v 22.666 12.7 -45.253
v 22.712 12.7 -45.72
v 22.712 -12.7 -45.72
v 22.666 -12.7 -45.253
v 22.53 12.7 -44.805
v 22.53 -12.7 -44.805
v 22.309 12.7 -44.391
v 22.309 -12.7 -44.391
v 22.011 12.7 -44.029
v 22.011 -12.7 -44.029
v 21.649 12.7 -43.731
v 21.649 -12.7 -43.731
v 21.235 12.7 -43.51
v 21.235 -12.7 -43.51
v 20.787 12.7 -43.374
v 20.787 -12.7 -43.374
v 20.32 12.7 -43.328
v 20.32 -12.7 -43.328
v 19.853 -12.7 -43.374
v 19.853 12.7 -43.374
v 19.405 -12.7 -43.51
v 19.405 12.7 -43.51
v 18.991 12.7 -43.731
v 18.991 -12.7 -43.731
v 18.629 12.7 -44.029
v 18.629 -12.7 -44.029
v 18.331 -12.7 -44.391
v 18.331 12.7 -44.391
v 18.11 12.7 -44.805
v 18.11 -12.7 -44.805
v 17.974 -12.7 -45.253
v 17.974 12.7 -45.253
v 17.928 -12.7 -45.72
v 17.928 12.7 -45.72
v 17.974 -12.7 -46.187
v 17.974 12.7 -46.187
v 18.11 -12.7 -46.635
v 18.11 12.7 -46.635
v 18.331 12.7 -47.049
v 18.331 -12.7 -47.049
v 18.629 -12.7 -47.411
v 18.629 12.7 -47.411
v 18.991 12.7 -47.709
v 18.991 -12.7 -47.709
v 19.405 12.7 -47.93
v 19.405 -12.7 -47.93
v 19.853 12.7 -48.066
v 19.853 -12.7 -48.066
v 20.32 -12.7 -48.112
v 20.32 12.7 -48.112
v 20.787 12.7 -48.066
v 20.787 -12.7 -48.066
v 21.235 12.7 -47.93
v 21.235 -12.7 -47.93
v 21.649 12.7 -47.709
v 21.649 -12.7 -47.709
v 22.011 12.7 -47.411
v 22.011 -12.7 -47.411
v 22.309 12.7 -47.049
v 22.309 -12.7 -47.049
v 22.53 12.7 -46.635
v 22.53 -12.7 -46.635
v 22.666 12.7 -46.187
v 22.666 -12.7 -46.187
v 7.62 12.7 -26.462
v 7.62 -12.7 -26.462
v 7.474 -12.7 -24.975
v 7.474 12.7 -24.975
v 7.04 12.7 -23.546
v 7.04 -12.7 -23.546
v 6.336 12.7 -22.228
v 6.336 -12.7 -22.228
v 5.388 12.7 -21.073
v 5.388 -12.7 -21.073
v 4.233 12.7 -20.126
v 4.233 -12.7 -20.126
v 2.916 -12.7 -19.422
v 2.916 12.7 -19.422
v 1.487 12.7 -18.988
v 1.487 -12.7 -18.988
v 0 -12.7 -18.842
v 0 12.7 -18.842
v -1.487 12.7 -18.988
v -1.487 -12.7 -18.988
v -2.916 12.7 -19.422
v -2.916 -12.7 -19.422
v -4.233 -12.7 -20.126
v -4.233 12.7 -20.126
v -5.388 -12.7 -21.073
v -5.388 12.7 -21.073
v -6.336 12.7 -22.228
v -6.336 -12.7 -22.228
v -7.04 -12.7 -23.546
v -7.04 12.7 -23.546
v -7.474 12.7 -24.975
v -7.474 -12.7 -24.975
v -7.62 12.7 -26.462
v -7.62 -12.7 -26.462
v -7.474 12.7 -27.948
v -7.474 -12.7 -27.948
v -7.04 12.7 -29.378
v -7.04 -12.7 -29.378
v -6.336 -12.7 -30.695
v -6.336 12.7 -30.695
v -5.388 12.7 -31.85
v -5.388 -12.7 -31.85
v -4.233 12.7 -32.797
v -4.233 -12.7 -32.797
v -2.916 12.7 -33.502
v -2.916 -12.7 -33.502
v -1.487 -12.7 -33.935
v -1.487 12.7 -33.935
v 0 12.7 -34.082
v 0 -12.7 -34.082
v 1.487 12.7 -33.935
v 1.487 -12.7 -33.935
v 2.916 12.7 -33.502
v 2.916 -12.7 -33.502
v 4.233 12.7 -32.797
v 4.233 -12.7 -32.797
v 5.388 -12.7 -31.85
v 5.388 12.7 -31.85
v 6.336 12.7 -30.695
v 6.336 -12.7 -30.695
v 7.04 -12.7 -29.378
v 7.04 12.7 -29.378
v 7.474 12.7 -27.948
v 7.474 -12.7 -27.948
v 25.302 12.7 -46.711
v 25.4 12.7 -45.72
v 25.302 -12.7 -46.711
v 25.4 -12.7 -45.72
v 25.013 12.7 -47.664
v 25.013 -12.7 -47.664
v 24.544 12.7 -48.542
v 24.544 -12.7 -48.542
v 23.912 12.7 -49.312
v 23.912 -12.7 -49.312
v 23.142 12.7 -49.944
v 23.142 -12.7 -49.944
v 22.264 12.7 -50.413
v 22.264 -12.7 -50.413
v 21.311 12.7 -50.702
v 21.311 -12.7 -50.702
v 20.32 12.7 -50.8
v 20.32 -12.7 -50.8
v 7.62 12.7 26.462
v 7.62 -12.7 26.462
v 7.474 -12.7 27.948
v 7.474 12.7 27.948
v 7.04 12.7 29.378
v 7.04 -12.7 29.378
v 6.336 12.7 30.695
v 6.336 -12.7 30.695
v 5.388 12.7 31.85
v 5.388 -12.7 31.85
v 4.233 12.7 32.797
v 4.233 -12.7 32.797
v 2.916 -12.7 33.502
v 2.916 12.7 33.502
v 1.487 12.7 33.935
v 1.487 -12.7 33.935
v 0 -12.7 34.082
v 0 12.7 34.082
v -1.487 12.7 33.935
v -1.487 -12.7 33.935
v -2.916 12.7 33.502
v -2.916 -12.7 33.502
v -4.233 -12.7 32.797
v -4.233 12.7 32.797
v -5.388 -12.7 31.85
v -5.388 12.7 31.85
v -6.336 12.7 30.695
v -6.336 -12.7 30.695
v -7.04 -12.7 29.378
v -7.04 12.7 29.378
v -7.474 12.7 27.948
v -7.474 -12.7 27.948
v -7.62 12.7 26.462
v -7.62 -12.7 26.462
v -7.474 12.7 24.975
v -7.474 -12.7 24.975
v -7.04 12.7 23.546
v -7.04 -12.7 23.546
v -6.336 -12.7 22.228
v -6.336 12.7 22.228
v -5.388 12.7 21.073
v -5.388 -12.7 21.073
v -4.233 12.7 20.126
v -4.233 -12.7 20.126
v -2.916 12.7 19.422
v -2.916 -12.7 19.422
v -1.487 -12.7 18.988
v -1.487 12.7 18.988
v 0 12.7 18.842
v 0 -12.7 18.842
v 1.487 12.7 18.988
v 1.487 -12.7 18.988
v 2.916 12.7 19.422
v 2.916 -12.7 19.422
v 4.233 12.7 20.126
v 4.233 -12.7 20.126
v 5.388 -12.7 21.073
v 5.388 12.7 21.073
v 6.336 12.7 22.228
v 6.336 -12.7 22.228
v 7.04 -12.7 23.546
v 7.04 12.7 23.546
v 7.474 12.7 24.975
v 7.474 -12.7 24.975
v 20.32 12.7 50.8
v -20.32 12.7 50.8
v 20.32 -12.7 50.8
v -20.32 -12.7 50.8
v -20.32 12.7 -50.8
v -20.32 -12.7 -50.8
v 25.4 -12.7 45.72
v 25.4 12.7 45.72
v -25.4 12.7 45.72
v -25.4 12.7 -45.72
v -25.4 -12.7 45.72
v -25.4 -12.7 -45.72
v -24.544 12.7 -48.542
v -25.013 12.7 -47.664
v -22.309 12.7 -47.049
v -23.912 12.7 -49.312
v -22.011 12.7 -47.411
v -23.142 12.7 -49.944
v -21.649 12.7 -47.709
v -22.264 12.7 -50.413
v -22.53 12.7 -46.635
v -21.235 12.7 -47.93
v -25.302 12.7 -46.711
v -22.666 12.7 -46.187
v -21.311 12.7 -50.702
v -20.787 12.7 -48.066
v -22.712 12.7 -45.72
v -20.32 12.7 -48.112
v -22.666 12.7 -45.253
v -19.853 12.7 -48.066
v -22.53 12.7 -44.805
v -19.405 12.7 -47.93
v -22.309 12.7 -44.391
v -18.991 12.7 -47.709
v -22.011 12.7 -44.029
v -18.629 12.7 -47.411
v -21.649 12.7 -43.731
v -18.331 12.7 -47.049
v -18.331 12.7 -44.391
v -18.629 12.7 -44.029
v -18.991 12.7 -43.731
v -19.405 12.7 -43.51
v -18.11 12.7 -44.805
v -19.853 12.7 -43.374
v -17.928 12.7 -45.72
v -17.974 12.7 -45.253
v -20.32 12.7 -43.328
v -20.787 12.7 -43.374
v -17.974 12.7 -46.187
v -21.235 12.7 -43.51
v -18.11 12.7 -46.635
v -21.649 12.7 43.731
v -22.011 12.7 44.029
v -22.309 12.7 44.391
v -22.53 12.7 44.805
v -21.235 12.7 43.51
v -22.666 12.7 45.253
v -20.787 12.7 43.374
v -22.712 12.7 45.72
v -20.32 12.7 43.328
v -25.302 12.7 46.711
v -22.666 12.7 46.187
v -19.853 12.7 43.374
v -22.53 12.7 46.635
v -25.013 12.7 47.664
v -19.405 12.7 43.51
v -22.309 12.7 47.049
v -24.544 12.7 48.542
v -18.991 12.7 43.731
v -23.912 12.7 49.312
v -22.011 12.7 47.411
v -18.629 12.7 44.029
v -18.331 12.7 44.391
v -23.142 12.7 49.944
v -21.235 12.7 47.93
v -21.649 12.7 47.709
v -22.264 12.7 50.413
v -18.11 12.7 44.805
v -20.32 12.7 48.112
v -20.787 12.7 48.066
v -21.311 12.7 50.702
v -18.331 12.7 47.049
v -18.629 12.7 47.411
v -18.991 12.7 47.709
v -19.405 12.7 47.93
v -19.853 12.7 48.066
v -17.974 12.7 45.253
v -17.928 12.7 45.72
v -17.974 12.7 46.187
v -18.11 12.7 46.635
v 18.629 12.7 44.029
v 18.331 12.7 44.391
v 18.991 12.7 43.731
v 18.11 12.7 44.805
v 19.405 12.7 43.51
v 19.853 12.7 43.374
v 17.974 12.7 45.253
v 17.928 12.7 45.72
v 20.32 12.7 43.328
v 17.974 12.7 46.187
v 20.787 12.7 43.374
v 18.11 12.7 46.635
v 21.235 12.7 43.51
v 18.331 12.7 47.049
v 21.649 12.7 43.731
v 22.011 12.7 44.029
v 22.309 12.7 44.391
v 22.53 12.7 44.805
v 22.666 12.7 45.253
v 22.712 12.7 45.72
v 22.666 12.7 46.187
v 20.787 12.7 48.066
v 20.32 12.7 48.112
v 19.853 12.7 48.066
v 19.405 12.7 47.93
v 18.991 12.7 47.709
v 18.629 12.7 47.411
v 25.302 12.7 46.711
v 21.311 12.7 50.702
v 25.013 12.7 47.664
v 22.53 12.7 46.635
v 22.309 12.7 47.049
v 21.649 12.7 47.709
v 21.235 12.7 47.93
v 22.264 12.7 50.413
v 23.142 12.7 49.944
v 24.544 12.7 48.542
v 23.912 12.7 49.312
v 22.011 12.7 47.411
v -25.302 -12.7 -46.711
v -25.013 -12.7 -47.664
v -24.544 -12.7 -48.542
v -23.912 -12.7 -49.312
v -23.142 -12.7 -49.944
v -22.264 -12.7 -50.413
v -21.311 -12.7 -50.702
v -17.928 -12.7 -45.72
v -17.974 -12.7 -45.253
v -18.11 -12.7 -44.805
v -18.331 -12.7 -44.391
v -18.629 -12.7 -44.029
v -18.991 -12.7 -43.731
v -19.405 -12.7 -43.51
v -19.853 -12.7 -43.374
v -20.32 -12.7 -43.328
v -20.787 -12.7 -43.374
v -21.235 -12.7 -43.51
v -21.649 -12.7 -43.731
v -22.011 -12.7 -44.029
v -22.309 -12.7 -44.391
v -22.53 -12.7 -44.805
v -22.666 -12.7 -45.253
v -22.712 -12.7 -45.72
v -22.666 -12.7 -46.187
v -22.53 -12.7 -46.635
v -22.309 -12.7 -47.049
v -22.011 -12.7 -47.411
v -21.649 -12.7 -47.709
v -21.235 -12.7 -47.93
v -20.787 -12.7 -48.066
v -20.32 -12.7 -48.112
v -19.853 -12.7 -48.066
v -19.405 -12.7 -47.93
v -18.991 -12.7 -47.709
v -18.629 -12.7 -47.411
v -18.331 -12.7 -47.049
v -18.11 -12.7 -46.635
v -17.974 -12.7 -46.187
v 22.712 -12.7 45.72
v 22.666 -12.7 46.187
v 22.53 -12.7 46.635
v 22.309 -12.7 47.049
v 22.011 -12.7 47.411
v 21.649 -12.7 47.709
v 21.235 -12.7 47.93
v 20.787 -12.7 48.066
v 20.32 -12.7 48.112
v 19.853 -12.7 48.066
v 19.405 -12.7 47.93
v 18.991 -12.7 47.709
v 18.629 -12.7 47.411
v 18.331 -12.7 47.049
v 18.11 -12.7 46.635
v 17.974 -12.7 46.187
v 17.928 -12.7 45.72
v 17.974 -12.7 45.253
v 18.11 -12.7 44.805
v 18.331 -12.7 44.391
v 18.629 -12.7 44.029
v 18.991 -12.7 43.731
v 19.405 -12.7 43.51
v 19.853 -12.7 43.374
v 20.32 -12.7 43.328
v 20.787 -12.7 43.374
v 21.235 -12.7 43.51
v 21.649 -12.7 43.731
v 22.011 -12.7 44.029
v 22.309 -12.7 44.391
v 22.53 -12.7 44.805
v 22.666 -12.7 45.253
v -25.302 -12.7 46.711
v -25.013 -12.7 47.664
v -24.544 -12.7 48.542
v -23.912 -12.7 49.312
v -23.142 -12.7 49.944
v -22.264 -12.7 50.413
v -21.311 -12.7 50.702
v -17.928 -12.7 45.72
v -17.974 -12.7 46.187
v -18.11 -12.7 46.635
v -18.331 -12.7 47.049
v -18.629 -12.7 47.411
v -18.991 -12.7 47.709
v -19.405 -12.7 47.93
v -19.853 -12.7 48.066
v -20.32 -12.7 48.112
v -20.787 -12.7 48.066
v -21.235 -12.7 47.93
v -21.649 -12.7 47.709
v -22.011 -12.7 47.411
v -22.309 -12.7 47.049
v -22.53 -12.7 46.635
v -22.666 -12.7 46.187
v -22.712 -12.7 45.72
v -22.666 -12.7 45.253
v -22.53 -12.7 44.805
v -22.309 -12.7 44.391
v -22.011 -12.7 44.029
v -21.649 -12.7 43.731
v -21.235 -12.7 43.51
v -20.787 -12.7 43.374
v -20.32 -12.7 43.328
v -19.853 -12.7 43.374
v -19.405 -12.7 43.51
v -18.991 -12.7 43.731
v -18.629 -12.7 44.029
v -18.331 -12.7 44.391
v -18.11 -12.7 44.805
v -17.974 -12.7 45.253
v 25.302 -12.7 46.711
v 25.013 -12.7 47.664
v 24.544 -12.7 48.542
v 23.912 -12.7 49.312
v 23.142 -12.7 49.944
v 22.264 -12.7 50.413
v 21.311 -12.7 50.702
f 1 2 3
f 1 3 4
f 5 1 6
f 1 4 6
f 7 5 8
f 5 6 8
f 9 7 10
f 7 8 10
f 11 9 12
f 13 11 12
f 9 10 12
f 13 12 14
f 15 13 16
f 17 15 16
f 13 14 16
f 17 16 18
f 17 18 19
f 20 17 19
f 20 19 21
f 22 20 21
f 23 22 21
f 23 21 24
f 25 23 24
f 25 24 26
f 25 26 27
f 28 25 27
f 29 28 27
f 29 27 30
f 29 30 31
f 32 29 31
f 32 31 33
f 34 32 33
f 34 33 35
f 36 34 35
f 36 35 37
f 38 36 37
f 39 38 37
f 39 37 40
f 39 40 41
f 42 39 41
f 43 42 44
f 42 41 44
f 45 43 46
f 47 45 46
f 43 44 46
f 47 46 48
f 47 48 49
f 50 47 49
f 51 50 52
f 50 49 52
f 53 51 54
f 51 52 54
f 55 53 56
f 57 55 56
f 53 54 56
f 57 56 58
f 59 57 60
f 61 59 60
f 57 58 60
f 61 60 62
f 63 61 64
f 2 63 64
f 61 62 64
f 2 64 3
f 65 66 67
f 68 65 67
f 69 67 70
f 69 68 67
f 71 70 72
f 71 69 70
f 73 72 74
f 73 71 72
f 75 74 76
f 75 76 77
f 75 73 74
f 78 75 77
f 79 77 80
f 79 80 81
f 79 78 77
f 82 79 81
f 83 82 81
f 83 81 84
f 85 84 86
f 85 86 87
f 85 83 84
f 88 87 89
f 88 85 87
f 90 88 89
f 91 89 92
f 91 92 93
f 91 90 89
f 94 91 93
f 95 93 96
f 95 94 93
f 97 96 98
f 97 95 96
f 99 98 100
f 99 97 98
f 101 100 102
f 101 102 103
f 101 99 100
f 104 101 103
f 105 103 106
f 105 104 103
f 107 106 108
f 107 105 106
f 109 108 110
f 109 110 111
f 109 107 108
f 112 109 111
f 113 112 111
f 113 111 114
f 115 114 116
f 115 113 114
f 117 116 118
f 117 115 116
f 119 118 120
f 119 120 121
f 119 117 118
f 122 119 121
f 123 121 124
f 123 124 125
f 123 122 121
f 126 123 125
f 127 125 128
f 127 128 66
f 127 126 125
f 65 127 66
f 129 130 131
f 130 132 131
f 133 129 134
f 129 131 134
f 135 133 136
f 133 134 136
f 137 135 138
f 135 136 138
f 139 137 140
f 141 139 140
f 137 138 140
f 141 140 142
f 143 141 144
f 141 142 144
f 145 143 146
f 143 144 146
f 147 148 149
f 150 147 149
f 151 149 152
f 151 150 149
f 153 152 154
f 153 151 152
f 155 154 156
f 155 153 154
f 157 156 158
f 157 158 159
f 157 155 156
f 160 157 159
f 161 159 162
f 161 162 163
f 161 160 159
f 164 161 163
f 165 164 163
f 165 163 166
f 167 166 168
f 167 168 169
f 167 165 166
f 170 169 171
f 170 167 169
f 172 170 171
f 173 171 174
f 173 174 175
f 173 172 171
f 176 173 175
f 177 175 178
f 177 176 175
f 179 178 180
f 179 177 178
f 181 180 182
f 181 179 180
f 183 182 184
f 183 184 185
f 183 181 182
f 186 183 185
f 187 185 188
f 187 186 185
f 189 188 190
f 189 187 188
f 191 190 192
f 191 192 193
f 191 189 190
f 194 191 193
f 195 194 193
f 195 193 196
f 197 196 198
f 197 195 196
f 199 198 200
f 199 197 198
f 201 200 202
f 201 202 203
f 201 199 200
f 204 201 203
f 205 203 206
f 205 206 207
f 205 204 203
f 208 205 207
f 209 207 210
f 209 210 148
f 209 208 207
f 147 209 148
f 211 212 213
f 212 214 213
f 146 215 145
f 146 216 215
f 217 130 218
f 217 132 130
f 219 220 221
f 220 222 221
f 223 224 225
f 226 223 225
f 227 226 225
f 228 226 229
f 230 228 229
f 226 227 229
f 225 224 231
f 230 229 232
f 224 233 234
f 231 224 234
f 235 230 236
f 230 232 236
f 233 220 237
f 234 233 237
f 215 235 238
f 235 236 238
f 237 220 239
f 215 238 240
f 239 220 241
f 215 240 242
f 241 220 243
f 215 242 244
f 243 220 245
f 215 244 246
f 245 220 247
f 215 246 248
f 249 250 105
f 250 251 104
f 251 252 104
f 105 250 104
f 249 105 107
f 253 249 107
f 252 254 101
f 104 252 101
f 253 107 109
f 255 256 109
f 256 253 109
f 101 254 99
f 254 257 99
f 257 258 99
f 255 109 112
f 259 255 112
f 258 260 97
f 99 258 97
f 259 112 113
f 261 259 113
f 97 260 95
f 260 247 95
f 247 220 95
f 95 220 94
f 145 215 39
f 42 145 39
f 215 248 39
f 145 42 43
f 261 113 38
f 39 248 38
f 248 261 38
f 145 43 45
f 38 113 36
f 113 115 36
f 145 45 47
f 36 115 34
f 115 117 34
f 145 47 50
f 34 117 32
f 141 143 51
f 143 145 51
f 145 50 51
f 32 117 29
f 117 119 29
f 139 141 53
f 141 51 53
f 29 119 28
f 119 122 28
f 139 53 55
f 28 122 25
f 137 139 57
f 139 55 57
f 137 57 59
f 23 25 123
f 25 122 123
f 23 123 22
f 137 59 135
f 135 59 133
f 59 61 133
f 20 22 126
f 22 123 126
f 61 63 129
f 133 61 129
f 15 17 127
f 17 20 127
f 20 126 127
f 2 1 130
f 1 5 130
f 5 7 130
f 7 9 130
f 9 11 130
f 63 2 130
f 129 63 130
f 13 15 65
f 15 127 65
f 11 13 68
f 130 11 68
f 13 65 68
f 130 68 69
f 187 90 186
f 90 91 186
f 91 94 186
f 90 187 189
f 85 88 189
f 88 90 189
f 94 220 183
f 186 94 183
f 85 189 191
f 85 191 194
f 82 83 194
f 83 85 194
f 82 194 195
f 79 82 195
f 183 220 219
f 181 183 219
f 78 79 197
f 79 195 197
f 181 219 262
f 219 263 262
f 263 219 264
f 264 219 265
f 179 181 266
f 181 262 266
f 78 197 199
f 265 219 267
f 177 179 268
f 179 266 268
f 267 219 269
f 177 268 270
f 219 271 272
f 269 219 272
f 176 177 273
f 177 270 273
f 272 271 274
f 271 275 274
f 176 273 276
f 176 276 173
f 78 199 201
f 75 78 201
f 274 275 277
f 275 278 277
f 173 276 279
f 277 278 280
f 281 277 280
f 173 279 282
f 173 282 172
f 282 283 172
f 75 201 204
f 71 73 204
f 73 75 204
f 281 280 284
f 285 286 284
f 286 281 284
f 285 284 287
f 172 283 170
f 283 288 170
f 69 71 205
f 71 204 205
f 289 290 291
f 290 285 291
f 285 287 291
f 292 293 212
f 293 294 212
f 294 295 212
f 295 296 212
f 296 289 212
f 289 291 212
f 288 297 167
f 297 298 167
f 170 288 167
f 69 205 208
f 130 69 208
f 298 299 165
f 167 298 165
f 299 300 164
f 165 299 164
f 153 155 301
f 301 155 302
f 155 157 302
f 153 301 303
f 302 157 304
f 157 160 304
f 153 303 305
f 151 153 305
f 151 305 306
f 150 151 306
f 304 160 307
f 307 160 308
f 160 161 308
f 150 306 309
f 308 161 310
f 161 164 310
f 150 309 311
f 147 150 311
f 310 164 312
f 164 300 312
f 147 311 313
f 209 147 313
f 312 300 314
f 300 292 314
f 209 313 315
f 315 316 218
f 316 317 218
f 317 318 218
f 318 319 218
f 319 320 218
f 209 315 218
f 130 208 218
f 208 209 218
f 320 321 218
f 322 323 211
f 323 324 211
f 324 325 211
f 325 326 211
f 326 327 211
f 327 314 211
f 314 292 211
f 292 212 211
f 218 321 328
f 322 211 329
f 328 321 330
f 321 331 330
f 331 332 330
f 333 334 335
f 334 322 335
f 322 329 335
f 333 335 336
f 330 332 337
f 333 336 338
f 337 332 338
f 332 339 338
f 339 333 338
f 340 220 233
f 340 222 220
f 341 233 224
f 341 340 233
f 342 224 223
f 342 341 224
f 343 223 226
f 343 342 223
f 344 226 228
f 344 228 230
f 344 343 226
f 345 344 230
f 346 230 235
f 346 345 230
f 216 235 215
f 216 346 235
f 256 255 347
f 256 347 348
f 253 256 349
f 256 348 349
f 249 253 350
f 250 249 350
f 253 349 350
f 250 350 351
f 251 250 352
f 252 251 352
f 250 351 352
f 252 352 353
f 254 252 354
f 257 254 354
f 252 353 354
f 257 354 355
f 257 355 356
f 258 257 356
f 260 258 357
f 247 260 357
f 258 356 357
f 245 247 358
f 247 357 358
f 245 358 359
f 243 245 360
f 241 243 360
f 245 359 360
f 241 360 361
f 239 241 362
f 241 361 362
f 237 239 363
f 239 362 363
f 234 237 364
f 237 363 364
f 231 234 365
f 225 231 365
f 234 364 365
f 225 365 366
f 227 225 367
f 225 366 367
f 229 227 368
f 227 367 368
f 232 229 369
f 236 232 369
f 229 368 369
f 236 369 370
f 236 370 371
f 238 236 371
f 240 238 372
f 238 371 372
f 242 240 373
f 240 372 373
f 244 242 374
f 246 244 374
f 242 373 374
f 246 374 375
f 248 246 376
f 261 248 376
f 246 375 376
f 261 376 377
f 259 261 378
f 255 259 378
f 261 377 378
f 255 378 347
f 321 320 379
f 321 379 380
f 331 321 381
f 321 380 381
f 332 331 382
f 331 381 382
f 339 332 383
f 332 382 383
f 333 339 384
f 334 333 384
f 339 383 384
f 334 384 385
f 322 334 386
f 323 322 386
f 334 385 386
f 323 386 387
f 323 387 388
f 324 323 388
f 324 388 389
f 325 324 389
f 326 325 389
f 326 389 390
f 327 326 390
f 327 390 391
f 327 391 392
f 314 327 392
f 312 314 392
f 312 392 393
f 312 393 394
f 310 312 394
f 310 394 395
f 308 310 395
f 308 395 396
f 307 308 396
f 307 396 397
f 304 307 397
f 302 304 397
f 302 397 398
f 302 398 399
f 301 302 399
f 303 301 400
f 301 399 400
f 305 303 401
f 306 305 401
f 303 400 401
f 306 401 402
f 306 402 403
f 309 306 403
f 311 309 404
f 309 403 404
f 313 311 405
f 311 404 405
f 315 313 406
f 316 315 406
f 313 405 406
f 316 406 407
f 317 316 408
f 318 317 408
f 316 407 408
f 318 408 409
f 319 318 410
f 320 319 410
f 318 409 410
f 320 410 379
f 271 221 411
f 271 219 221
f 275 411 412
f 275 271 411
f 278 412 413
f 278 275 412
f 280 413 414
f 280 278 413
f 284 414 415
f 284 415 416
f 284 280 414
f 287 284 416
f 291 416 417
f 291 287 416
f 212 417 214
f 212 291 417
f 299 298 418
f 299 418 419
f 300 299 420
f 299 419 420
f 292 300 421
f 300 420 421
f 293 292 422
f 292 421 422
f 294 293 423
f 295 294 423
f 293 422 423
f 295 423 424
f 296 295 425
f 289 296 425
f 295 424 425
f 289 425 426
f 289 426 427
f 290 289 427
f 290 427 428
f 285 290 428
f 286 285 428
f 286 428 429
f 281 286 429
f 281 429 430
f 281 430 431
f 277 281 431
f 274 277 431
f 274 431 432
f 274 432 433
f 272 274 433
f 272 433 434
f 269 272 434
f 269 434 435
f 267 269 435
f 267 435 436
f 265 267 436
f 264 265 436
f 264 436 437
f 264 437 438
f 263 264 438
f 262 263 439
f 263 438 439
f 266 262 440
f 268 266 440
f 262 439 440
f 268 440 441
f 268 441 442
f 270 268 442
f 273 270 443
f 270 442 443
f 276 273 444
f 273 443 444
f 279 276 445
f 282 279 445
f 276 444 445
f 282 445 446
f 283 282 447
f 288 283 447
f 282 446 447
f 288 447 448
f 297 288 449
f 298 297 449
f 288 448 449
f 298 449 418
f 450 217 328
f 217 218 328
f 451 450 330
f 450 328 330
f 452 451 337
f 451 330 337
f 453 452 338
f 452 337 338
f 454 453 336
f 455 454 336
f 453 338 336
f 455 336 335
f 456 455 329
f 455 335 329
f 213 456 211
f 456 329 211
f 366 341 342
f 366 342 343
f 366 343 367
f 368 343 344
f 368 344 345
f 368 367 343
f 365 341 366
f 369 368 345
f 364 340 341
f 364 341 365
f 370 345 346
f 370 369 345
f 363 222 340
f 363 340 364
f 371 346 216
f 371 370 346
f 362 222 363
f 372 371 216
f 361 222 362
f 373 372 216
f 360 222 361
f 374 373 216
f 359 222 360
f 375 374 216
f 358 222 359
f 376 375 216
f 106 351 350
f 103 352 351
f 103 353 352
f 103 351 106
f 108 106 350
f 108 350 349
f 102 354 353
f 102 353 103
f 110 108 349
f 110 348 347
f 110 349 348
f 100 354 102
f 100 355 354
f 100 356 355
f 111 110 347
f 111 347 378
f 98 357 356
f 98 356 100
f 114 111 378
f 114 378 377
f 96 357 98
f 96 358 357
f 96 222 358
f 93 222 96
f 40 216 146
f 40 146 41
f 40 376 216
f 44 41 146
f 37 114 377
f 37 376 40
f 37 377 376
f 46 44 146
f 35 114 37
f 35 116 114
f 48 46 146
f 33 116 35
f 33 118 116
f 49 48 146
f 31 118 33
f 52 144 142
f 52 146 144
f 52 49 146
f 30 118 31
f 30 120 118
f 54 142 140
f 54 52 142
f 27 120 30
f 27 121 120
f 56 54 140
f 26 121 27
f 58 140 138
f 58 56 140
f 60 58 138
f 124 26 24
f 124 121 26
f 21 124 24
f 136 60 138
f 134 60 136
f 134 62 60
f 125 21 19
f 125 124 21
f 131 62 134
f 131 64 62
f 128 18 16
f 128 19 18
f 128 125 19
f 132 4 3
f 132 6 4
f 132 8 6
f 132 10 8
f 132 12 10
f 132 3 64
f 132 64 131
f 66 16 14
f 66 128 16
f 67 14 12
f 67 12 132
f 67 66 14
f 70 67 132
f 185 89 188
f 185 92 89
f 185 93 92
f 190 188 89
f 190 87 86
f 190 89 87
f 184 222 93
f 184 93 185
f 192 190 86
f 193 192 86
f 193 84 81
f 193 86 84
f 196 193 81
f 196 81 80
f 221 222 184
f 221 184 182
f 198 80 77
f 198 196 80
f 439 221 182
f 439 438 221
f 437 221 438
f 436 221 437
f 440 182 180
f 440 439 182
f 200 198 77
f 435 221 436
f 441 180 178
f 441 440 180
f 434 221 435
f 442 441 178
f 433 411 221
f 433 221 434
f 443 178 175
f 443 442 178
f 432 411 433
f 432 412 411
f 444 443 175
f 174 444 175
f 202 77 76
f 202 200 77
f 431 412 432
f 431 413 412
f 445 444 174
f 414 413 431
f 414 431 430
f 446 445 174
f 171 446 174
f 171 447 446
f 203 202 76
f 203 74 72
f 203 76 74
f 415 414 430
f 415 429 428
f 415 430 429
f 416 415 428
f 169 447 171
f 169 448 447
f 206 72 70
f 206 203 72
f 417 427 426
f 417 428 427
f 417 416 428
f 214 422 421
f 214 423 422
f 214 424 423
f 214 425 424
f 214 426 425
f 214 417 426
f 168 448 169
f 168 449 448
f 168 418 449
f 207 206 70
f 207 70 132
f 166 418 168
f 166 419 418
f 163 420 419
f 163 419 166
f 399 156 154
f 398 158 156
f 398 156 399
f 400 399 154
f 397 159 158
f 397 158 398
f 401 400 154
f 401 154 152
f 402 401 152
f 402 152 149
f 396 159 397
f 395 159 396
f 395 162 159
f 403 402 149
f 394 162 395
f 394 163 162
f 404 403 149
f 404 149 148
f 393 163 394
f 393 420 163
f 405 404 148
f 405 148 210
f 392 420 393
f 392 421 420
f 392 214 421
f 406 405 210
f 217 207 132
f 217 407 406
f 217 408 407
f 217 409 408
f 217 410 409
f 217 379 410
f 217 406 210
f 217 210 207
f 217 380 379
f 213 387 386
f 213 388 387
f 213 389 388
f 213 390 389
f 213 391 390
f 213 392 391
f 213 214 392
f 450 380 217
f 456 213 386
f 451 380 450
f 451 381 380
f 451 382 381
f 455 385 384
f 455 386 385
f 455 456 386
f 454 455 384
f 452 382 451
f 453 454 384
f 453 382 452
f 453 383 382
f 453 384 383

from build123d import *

# Parameters (mm, degrees)
F0_W     = 50.8
F0_H     = 101.6
F0_R     = 7.62
F1_DEPTH = 12.7
F2_R     = 5.08
F3_R     = 2.39168
F4_DEPTH = 72.39


with BuildPart() as f1:
    # F0 (on Front) → F1 (new body, symmetric)
    with BuildSketch(Plane.XZ):
        Rectangle(F0_W, F0_H)
        with Locations((0, -26.461581)):
            Circle(F0_R, mode=Mode.SUBTRACT)
        with Locations((0, 26.461581)):
            Circle(F0_R, mode=Mode.SUBTRACT)
    extrude(amount=F1_DEPTH, both=True)

    # F2
    f2_edges = [f1.edges().sort_by_distance(p)[0] for p in [
        (-25.4, 0, 50.8),
        (25.4, 0, 50.8),
        (25.4, 0, -50.8),
        (-25.4, 0, -50.8),
    ]]
    fillet(f2_edges, radius=F2_R)

    # F3 (on face) → F4 (cut, symmetric)
    with BuildSketch(Plane.XZ.offset(12.7)):
        with Locations((-20.32, 45.72)):
            Circle(F3_R)
        with Locations((20.32, 45.72)):
            Circle(F3_R)
        with Locations((20.32, -45.72)):
            Circle(F3_R)
        with Locations((-20.32, -45.72)):
            Circle(F3_R)
    extrude(amount=F4_DEPTH, both=True, mode=Mode.SUBTRACT)


solid = f1.part
